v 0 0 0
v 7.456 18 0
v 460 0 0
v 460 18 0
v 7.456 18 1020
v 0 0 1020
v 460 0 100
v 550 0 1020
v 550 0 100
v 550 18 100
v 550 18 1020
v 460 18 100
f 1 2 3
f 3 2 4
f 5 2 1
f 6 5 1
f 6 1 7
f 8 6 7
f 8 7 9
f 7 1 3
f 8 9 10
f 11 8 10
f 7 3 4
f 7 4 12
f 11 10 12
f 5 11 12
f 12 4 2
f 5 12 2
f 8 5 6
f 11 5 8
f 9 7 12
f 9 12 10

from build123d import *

# Parameters (mm, degrees)
F1_DEPTH = 1020
F2_W     = 90
F2_H     = 100
F3_DEPTH = 25


with BuildPart() as f1:
    # F0 (on Top) → F1 (new body)
    with BuildSketch(Plane.XY):
        Polygon((7.455844, 18), (0, 0), (550, 0), (550, 18), align=None)
    extrude(amount=F1_DEPTH)

    # F2 (on Front) → F3 (cut)
    with BuildSketch(Plane.XZ):
        with Locations((505, 50)):
            Rectangle(F2_W, F2_H)
    extrude(amount=-F3_DEPTH, mode=Mode.SUBTRACT)


solid = f1.part
